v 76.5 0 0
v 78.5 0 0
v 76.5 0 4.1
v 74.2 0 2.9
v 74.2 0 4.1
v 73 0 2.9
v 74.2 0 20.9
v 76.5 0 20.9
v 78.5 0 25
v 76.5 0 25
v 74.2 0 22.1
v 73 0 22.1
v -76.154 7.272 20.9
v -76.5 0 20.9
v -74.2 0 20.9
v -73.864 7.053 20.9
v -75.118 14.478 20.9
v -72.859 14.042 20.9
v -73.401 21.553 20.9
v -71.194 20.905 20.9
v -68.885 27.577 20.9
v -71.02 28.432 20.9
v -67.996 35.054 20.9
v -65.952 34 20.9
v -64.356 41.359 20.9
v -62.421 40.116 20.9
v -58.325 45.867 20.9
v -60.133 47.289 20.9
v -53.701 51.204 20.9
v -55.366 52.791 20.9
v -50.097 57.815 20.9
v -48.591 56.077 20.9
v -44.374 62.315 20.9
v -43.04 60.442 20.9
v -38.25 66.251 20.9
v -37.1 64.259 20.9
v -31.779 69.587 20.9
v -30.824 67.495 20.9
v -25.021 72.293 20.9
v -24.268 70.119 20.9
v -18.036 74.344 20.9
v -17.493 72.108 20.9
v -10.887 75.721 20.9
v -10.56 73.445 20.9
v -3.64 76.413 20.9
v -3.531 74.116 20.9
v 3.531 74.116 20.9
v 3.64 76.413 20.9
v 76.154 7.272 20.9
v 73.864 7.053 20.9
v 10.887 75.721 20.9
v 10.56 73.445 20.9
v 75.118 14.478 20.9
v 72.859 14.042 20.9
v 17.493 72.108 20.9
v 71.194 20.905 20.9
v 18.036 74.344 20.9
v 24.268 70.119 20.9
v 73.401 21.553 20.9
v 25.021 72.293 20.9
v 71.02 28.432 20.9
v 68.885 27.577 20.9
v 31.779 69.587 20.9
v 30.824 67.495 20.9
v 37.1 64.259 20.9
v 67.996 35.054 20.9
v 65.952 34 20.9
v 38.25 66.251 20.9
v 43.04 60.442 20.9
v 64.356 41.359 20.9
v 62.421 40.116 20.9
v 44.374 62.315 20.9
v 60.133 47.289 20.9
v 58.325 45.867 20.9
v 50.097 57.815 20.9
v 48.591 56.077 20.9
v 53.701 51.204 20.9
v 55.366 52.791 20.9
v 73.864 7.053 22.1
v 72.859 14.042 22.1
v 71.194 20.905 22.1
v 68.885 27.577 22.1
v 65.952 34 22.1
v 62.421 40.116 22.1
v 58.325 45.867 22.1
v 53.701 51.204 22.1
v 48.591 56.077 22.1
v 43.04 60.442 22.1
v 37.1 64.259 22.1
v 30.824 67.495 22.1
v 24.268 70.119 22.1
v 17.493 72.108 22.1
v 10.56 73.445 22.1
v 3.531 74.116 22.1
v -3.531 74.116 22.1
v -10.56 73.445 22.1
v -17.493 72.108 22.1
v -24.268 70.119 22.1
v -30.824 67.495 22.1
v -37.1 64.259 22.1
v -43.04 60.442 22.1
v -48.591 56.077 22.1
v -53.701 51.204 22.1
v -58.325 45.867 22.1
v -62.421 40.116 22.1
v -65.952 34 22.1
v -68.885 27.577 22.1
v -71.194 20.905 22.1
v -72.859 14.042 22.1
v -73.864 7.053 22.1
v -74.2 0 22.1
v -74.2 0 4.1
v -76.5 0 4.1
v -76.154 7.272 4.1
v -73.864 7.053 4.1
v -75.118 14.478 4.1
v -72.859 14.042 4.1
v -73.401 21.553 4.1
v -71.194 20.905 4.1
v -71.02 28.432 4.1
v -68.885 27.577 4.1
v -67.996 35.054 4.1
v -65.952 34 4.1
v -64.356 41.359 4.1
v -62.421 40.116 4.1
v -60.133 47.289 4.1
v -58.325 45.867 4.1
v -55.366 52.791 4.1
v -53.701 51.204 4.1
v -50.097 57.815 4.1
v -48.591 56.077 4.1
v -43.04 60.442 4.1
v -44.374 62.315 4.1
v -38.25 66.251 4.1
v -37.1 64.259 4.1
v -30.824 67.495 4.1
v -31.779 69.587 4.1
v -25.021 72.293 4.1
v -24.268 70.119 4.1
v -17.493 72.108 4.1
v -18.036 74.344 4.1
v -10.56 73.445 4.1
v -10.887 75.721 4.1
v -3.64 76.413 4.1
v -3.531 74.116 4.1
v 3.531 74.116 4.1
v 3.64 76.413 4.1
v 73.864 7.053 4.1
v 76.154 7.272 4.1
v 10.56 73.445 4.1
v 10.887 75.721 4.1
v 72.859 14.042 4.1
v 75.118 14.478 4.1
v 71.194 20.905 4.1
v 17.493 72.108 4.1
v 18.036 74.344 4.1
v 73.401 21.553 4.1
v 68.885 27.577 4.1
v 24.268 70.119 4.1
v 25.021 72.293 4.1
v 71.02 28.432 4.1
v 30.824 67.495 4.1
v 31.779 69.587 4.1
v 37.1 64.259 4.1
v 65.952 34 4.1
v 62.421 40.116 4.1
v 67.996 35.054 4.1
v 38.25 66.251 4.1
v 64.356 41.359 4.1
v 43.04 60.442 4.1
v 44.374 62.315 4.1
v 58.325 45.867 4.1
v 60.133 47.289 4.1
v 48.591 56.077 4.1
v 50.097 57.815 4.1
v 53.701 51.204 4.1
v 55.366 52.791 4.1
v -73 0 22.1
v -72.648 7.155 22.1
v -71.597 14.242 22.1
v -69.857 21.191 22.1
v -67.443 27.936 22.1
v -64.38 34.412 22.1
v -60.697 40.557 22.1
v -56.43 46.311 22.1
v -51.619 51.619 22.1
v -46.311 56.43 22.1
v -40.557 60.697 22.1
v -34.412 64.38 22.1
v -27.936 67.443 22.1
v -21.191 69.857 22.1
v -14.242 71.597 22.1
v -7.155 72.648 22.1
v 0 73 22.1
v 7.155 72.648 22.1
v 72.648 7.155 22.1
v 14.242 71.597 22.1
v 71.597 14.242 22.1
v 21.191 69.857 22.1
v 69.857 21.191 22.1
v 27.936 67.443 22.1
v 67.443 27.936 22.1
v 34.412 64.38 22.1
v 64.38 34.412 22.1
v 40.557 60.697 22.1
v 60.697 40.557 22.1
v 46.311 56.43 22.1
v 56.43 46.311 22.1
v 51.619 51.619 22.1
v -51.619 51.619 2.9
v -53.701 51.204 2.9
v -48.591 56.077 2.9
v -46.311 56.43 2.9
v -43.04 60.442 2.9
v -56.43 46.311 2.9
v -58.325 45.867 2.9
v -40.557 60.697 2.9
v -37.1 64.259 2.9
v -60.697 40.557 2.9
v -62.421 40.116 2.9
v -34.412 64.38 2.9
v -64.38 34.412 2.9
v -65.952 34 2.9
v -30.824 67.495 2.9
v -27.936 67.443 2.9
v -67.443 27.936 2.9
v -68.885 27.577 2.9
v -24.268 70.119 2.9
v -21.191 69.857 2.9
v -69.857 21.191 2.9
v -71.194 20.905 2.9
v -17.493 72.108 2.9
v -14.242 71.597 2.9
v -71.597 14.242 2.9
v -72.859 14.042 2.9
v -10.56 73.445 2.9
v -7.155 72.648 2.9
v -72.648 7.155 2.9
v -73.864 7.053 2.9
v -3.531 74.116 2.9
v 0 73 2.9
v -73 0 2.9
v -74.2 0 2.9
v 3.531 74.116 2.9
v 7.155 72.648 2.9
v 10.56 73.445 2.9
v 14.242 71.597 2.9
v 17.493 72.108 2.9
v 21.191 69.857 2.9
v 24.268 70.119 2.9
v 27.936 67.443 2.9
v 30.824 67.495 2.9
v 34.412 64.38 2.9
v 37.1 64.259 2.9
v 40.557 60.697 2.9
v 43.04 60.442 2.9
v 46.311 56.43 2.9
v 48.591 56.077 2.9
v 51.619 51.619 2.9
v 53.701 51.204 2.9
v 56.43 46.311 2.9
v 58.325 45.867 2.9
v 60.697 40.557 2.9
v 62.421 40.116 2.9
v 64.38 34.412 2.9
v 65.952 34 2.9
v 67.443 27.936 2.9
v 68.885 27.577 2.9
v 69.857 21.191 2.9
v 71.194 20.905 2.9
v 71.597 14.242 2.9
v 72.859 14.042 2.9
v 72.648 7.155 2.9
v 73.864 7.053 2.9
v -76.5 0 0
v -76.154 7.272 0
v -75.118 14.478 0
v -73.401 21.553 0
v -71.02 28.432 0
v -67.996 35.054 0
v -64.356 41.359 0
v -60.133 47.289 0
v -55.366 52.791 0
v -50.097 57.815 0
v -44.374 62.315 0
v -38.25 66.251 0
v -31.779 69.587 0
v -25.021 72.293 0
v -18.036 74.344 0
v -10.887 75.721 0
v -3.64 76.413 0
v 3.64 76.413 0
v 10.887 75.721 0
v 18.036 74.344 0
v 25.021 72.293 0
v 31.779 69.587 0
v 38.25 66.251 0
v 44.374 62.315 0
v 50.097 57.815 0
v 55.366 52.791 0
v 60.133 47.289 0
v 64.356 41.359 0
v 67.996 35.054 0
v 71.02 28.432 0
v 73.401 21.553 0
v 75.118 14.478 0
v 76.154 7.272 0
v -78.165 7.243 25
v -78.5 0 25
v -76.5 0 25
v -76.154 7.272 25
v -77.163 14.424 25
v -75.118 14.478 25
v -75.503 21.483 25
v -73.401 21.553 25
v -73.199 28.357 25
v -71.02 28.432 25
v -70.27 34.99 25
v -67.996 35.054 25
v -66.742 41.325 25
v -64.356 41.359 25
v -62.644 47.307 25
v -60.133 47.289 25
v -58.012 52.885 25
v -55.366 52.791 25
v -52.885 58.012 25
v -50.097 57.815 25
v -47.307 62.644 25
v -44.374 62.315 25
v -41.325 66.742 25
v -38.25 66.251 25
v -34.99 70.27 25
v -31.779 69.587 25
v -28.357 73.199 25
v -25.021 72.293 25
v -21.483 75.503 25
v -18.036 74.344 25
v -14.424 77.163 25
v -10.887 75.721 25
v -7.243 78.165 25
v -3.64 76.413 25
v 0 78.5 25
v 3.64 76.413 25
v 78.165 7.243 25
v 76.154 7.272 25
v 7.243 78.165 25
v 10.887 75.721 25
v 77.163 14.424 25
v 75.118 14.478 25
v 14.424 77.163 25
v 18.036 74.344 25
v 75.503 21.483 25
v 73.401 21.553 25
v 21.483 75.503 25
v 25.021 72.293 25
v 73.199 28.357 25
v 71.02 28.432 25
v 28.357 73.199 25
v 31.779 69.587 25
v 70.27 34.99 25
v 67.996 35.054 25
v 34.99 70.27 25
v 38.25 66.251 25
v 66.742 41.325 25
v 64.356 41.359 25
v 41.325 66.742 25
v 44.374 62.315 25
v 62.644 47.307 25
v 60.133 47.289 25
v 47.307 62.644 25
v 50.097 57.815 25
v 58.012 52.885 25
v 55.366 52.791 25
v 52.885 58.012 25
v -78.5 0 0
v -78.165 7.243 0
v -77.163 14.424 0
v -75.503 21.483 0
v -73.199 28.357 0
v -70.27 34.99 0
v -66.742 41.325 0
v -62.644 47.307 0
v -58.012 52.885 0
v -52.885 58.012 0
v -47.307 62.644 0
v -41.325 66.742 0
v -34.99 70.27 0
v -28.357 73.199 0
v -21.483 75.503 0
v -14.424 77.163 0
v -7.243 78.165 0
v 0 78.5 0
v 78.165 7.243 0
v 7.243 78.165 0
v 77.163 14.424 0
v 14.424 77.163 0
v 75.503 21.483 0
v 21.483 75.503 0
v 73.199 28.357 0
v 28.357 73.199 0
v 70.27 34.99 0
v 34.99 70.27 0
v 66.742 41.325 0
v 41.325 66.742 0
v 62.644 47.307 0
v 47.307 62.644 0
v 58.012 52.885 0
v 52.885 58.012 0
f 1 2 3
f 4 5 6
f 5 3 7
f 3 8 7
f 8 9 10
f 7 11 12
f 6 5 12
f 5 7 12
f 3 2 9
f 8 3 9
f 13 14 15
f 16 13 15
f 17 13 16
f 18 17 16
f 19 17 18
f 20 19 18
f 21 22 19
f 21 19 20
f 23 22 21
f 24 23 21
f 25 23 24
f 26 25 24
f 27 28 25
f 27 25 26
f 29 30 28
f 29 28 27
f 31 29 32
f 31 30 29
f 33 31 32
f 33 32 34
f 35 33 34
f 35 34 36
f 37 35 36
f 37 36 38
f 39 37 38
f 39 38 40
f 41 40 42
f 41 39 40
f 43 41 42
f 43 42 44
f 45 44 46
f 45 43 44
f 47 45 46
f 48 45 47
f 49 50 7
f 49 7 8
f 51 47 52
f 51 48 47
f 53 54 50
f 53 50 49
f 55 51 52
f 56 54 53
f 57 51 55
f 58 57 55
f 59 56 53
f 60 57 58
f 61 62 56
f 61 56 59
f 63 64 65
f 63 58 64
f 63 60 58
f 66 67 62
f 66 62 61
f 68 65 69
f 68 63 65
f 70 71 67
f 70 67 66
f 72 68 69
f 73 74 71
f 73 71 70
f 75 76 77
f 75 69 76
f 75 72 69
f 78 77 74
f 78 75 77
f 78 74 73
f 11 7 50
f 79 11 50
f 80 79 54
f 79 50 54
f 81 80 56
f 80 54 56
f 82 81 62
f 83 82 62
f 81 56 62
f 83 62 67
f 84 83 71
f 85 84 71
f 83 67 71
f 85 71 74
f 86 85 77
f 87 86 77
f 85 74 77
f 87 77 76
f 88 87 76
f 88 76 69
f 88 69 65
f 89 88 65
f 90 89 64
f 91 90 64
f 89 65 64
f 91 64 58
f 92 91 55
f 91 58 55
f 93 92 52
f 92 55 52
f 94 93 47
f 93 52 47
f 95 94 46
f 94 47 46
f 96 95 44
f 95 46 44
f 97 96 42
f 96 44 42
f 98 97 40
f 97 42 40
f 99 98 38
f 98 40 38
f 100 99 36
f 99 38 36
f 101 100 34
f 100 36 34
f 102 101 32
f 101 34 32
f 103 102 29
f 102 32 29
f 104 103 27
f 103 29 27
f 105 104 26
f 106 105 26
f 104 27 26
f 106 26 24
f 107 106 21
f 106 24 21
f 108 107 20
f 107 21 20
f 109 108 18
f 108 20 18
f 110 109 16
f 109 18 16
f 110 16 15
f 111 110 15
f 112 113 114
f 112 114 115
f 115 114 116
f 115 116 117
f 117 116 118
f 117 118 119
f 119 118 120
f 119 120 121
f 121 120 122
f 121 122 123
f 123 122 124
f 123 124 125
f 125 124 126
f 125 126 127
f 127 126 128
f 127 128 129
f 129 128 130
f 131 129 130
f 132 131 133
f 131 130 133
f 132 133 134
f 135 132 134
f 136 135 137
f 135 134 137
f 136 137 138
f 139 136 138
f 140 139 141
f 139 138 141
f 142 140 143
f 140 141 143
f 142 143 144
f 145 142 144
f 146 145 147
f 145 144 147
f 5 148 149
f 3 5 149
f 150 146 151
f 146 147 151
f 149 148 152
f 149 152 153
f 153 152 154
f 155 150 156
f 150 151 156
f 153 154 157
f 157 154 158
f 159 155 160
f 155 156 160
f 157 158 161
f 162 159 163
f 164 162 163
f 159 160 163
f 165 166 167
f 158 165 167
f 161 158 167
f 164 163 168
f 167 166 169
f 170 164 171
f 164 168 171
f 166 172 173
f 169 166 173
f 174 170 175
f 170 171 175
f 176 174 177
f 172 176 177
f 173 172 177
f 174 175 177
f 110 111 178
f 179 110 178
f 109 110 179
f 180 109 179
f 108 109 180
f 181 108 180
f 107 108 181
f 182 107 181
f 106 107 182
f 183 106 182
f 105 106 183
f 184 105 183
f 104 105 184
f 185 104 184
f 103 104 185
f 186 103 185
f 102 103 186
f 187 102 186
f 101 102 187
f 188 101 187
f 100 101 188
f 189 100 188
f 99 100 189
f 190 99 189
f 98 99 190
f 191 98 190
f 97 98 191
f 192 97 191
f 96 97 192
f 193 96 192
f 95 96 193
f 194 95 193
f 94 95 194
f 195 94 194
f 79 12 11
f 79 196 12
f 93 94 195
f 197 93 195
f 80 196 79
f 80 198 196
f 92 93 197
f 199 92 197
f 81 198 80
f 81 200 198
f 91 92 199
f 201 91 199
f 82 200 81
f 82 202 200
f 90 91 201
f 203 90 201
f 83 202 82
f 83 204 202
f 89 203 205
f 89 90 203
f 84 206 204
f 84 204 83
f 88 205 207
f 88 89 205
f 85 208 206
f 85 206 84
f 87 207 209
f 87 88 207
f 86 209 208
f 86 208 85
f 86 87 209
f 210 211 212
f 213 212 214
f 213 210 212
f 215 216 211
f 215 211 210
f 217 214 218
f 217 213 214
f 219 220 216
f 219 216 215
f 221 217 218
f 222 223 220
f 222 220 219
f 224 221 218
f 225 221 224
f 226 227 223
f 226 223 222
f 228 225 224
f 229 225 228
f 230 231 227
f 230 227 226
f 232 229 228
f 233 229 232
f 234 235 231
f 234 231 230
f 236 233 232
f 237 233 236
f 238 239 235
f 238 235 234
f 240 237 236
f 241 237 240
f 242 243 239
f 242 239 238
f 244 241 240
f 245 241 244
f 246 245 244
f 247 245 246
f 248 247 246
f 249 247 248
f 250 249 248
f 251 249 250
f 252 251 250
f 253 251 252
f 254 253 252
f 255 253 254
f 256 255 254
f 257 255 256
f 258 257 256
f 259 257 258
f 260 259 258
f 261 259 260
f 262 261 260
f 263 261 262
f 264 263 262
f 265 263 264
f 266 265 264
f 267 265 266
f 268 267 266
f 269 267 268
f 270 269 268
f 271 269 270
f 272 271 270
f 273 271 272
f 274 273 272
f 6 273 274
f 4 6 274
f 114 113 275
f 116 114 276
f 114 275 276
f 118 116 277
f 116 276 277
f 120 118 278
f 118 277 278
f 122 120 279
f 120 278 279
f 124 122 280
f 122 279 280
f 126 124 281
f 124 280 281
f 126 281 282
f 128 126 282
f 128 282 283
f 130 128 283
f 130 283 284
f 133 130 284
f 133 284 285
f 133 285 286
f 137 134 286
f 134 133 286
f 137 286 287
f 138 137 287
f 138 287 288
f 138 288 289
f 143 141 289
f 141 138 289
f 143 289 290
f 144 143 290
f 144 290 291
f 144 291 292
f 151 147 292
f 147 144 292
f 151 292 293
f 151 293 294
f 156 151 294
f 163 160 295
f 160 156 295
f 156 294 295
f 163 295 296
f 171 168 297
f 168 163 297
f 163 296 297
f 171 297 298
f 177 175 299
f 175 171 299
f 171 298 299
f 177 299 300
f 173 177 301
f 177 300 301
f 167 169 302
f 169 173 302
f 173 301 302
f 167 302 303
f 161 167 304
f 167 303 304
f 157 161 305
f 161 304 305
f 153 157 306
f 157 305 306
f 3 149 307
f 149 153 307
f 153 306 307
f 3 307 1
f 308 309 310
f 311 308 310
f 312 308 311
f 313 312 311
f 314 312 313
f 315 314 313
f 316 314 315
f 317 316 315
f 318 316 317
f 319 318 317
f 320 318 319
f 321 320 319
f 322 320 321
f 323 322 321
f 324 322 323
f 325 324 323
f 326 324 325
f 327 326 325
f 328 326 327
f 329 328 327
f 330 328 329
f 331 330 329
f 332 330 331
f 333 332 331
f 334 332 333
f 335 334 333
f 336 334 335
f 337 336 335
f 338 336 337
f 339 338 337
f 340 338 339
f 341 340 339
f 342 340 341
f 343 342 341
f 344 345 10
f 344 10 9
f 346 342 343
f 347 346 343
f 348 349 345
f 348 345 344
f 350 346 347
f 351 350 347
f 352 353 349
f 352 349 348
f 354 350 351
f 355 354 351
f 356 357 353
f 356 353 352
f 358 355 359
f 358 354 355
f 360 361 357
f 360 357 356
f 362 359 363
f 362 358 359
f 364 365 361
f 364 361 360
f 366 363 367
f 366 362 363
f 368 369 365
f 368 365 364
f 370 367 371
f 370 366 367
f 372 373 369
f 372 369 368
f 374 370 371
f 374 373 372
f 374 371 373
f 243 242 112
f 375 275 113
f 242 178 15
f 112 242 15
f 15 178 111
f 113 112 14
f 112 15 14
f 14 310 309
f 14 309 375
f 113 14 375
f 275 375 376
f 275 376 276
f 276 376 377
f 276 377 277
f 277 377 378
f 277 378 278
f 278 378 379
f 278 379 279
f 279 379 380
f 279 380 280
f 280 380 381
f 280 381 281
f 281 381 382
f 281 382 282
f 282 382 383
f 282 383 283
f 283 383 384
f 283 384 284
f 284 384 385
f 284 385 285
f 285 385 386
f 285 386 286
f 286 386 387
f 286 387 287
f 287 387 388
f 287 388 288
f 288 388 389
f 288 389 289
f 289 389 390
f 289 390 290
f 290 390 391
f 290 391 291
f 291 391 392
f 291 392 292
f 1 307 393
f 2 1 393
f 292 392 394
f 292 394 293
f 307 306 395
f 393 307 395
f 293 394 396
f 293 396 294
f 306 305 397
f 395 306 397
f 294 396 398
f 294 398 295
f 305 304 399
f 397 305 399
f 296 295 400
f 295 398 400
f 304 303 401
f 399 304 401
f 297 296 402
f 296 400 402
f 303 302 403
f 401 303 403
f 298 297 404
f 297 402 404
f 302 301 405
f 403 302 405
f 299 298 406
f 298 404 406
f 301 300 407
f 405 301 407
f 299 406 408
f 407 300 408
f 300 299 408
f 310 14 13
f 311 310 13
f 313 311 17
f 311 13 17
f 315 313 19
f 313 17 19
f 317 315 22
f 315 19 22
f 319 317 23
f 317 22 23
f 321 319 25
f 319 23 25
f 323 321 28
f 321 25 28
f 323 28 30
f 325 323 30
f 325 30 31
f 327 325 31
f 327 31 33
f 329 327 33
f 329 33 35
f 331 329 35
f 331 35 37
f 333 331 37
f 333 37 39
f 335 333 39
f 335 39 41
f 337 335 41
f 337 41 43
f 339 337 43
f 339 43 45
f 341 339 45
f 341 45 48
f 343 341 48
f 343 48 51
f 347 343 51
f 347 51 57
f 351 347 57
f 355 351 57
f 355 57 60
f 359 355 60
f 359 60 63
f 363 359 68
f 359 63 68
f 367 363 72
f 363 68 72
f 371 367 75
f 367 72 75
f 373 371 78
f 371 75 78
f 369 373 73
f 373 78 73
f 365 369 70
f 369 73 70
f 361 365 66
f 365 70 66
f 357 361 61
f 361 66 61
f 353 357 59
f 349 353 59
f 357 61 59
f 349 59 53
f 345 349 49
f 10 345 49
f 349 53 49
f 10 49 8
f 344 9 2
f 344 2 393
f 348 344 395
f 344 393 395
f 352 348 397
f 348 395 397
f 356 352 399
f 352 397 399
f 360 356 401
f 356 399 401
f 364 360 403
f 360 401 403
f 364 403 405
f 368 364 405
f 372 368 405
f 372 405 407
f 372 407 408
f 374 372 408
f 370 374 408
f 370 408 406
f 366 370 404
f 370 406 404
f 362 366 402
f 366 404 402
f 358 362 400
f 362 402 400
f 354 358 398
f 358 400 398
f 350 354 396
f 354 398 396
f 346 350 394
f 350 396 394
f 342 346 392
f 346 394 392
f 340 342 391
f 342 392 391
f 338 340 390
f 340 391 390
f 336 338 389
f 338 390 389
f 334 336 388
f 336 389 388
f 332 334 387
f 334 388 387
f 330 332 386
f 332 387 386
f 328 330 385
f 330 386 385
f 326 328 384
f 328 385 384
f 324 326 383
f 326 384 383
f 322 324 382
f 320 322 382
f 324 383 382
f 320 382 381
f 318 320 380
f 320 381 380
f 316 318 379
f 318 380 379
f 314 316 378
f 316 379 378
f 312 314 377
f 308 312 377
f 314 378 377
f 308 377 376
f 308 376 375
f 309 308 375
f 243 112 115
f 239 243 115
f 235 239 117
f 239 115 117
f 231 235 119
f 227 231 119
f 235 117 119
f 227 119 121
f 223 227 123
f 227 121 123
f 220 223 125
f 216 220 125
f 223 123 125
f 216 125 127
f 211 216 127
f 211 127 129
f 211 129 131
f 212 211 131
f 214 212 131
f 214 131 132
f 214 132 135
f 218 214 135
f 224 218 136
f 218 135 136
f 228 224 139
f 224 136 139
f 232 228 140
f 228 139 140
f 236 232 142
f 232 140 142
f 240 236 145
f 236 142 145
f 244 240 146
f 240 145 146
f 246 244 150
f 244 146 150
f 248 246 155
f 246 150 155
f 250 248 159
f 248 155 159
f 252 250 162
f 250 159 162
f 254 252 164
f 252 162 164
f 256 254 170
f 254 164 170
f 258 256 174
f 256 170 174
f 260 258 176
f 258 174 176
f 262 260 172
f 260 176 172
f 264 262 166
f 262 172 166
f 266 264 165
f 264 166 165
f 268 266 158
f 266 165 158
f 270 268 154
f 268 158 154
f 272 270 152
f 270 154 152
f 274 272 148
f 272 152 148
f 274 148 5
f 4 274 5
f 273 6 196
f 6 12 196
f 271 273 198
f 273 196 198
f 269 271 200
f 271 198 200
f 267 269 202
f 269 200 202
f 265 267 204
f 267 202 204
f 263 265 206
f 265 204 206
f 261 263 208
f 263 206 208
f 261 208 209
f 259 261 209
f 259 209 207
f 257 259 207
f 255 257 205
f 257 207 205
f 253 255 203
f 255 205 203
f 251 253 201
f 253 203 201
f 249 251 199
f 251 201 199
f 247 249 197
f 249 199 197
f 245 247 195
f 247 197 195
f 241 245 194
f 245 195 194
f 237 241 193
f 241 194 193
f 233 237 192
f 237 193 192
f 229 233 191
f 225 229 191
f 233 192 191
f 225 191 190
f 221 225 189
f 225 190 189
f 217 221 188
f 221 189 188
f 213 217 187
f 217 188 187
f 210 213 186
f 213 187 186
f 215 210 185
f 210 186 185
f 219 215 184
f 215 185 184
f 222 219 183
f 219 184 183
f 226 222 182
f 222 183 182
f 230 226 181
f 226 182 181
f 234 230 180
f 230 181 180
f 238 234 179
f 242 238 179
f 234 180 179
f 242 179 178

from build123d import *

# Parameters (mm, degrees)
F1_DEPTH = 25
F4_DEPTH = 16.8
F6_DEPTH = 1.2
F8_DEPTH = 1.2


with BuildPart() as f1:
    # F0 (on Top) → F1 (new body)
    with BuildSketch(Plane.XY):
        with BuildLine():
            ThreePointArc((-76.5, 0), (0, 76.5), (76.5, 0))
            Line((76.5, 0), (78.5, 0))
            ThreePointArc((78.5, 0), (0, 78.5), (-78.5, 0))
            Line((-78.5, 0), (-76.5, 0))
        make_face()
    extrude(amount=F1_DEPTH)

    # F3 (on offset) → F4 (join)
    with BuildSketch(Plane.XY.offset(4.1)):
        with BuildLine():
            Line((73, 0), (76.5, 0))
            ThreePointArc((76.5, 0), (0, 76.5), (-76.5, 0))
            Line((-76.5, 0), (-73, 0))
            ThreePointArc((-73, 0), (0, 73), (73, 0))
        make_face()
    extrude(amount=F4_DEPTH)

    # F5 (on face) → F6 (join)
    with BuildSketch(Plane.XY.offset(20.9)):
        with BuildLine():
            Line((73, 0), (74.2, 0))
            ThreePointArc((74.2, 0), (0, 74.2), (-74.2, 0))
            Line((-74.2, 0), (-73, 0))
            ThreePointArc((-73, 0), (0, 73), (73, 0))
        make_face()
    extrude(amount=F6_DEPTH)

    # F7 (on face) → F8 (join)
    with BuildSketch(Plane(origin=(0, 0, 4.1), x_dir=(1, 0, 0), z_dir=(0, 0, -1))):
        with BuildLine():
            ThreePointArc((-74.2, 0), (0, -74.2), (74.2, 0))
            Line((74.2, 0), (73, 0))
            ThreePointArc((73, 0), (0, -73), (-73, 0))
            Line((-73, 0), (-74.2, 0))
        make_face()
    extrude(amount=F8_DEPTH)


solid = f1.part
